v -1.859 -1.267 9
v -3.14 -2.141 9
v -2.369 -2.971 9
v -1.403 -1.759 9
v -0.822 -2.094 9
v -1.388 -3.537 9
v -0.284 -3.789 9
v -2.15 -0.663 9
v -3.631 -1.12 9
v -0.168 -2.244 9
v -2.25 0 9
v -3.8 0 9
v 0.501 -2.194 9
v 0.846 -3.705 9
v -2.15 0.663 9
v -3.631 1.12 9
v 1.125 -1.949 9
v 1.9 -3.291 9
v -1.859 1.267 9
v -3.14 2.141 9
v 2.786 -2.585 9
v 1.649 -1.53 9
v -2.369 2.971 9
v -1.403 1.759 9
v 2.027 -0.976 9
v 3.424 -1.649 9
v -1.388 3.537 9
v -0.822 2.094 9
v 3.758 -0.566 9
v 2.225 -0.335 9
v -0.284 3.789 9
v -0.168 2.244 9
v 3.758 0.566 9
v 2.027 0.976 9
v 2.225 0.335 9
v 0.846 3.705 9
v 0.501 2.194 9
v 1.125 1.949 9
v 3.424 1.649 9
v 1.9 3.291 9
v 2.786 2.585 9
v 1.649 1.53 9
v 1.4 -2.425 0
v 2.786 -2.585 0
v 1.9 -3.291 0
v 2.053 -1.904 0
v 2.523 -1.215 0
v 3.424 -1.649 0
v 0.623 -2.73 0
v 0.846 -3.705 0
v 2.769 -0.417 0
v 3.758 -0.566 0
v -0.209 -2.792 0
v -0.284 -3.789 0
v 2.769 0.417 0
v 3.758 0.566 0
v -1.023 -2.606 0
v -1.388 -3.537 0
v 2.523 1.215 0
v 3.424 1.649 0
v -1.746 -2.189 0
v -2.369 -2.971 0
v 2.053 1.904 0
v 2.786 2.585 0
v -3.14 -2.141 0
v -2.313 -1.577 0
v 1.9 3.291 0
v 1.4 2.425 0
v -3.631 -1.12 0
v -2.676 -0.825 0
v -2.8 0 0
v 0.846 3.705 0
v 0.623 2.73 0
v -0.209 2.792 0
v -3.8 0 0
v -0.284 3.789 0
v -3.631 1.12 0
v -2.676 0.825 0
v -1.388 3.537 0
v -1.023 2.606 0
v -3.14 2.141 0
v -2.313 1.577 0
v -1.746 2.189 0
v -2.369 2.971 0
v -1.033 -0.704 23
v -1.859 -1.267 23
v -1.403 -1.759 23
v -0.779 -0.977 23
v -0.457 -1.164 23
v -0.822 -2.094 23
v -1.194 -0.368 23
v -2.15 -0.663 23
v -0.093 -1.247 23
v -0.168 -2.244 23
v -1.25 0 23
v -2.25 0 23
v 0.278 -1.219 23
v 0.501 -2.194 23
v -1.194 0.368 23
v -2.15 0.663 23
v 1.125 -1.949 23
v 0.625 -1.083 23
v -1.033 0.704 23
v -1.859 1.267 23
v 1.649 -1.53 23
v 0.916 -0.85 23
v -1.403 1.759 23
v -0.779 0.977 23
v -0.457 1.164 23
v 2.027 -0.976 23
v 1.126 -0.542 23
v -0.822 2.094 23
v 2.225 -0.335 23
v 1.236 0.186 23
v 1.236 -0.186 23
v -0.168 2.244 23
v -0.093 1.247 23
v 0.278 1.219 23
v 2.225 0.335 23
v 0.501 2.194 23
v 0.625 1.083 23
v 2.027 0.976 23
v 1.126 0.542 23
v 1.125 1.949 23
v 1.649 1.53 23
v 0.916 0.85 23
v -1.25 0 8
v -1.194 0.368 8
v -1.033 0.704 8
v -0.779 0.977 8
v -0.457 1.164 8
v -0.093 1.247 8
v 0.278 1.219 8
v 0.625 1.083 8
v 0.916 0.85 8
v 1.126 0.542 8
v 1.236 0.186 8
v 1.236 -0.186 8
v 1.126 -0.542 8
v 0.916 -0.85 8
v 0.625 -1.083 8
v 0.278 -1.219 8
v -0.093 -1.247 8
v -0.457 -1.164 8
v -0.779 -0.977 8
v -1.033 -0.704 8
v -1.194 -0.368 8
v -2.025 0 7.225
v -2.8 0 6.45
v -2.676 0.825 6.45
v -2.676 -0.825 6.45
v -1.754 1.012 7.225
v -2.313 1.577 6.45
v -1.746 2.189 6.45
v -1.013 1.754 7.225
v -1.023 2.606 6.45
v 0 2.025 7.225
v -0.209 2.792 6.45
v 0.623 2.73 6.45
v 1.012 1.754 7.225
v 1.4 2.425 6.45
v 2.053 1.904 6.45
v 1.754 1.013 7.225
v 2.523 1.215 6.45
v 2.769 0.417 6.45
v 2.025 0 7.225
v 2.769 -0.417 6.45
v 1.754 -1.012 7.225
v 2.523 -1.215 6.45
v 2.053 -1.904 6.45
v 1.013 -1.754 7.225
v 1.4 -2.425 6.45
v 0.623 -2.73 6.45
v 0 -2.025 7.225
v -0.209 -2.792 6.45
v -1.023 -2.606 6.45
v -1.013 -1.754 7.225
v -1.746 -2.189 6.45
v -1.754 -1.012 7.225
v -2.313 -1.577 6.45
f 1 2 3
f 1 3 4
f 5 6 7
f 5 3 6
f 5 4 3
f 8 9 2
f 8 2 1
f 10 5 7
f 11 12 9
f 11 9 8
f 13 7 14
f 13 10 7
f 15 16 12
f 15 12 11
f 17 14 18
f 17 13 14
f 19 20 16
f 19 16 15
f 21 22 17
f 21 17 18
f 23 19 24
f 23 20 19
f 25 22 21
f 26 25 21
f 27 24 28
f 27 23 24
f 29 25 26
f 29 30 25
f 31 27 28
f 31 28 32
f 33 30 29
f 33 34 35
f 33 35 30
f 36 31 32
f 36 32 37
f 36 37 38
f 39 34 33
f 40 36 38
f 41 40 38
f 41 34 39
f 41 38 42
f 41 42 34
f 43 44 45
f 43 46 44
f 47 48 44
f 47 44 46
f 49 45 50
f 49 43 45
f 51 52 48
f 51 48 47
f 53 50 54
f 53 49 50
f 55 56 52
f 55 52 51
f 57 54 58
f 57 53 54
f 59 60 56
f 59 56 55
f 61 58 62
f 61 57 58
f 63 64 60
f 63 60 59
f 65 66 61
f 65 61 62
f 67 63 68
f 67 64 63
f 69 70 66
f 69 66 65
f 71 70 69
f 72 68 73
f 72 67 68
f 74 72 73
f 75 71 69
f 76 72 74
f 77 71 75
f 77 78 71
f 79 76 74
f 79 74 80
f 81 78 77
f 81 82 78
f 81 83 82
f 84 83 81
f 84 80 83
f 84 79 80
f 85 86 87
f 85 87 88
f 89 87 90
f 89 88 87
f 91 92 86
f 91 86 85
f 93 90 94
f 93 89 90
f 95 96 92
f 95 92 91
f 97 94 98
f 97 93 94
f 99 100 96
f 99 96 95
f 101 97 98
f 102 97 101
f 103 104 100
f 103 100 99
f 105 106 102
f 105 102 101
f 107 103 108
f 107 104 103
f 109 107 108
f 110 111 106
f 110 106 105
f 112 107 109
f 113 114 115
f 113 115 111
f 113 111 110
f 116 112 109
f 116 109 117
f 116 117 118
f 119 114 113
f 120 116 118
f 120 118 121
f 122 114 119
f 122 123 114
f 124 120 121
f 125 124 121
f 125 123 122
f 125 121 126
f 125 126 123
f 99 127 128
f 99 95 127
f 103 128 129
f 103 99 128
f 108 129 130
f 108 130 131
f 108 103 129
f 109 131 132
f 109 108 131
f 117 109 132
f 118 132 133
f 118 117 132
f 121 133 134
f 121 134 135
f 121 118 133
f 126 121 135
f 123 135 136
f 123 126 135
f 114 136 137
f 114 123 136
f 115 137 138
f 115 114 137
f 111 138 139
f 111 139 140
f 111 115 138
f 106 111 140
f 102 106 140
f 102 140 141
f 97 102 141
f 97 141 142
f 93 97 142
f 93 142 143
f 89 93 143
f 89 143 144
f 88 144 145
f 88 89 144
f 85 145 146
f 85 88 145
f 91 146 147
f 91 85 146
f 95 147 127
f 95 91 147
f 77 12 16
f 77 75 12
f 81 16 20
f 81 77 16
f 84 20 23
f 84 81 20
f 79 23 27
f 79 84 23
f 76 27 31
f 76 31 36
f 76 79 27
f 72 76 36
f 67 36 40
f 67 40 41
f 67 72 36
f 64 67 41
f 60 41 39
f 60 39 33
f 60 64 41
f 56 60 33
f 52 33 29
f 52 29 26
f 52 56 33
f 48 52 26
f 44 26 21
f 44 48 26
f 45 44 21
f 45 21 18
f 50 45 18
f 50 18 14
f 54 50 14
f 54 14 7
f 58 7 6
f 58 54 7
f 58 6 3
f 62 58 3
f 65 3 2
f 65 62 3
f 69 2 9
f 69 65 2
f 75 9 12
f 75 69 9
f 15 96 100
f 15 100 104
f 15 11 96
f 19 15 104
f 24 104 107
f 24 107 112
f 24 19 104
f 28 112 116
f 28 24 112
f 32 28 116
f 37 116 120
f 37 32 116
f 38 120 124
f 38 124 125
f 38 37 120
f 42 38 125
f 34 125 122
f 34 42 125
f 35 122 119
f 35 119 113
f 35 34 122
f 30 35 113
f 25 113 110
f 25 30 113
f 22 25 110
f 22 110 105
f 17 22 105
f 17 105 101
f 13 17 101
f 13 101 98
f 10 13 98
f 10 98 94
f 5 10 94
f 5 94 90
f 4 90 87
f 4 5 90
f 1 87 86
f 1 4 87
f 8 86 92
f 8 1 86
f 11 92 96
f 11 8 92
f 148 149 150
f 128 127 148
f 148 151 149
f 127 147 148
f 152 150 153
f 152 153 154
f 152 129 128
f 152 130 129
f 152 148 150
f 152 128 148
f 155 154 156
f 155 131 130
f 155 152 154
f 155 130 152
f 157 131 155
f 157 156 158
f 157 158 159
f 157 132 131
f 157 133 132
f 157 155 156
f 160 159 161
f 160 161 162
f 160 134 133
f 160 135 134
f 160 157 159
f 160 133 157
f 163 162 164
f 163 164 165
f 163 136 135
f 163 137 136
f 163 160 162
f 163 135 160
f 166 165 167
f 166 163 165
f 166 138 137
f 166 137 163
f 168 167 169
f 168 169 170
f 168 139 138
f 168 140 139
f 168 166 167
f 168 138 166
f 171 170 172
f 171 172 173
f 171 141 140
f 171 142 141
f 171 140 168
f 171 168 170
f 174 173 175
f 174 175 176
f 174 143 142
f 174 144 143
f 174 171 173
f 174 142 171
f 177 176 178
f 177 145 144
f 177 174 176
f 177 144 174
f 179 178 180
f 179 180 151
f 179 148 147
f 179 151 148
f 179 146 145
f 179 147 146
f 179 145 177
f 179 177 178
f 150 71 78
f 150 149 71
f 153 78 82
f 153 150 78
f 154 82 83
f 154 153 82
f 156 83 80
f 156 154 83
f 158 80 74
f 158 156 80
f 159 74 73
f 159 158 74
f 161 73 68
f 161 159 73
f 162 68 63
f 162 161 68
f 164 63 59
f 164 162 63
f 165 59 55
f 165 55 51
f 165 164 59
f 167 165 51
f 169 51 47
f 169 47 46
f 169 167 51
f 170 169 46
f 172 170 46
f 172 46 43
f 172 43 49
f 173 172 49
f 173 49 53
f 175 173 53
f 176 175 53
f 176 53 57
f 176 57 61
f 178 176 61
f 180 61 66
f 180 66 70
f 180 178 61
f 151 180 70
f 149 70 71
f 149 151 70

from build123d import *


with BuildPart() as f1:
    # F0 (on Front) → F1 (revolve)
    with BuildSketch(Plane.XZ):
        Polygon((-3.8, 0), (-2.8, 0), (-2.8, 6.45), (-2.8, 8), (-1.25, 8), (-1.25, 23), (-2.25, 23), (-2.25, 9), (-3.8, 9), align=None)
        Polygon((-2.8, 8), (-2.8, 6.45), (-1.25, 8), align=None)
    revolve(axis=Axis((0, 0, 11.5), (0, 0, -1)))


solid = f1.part
